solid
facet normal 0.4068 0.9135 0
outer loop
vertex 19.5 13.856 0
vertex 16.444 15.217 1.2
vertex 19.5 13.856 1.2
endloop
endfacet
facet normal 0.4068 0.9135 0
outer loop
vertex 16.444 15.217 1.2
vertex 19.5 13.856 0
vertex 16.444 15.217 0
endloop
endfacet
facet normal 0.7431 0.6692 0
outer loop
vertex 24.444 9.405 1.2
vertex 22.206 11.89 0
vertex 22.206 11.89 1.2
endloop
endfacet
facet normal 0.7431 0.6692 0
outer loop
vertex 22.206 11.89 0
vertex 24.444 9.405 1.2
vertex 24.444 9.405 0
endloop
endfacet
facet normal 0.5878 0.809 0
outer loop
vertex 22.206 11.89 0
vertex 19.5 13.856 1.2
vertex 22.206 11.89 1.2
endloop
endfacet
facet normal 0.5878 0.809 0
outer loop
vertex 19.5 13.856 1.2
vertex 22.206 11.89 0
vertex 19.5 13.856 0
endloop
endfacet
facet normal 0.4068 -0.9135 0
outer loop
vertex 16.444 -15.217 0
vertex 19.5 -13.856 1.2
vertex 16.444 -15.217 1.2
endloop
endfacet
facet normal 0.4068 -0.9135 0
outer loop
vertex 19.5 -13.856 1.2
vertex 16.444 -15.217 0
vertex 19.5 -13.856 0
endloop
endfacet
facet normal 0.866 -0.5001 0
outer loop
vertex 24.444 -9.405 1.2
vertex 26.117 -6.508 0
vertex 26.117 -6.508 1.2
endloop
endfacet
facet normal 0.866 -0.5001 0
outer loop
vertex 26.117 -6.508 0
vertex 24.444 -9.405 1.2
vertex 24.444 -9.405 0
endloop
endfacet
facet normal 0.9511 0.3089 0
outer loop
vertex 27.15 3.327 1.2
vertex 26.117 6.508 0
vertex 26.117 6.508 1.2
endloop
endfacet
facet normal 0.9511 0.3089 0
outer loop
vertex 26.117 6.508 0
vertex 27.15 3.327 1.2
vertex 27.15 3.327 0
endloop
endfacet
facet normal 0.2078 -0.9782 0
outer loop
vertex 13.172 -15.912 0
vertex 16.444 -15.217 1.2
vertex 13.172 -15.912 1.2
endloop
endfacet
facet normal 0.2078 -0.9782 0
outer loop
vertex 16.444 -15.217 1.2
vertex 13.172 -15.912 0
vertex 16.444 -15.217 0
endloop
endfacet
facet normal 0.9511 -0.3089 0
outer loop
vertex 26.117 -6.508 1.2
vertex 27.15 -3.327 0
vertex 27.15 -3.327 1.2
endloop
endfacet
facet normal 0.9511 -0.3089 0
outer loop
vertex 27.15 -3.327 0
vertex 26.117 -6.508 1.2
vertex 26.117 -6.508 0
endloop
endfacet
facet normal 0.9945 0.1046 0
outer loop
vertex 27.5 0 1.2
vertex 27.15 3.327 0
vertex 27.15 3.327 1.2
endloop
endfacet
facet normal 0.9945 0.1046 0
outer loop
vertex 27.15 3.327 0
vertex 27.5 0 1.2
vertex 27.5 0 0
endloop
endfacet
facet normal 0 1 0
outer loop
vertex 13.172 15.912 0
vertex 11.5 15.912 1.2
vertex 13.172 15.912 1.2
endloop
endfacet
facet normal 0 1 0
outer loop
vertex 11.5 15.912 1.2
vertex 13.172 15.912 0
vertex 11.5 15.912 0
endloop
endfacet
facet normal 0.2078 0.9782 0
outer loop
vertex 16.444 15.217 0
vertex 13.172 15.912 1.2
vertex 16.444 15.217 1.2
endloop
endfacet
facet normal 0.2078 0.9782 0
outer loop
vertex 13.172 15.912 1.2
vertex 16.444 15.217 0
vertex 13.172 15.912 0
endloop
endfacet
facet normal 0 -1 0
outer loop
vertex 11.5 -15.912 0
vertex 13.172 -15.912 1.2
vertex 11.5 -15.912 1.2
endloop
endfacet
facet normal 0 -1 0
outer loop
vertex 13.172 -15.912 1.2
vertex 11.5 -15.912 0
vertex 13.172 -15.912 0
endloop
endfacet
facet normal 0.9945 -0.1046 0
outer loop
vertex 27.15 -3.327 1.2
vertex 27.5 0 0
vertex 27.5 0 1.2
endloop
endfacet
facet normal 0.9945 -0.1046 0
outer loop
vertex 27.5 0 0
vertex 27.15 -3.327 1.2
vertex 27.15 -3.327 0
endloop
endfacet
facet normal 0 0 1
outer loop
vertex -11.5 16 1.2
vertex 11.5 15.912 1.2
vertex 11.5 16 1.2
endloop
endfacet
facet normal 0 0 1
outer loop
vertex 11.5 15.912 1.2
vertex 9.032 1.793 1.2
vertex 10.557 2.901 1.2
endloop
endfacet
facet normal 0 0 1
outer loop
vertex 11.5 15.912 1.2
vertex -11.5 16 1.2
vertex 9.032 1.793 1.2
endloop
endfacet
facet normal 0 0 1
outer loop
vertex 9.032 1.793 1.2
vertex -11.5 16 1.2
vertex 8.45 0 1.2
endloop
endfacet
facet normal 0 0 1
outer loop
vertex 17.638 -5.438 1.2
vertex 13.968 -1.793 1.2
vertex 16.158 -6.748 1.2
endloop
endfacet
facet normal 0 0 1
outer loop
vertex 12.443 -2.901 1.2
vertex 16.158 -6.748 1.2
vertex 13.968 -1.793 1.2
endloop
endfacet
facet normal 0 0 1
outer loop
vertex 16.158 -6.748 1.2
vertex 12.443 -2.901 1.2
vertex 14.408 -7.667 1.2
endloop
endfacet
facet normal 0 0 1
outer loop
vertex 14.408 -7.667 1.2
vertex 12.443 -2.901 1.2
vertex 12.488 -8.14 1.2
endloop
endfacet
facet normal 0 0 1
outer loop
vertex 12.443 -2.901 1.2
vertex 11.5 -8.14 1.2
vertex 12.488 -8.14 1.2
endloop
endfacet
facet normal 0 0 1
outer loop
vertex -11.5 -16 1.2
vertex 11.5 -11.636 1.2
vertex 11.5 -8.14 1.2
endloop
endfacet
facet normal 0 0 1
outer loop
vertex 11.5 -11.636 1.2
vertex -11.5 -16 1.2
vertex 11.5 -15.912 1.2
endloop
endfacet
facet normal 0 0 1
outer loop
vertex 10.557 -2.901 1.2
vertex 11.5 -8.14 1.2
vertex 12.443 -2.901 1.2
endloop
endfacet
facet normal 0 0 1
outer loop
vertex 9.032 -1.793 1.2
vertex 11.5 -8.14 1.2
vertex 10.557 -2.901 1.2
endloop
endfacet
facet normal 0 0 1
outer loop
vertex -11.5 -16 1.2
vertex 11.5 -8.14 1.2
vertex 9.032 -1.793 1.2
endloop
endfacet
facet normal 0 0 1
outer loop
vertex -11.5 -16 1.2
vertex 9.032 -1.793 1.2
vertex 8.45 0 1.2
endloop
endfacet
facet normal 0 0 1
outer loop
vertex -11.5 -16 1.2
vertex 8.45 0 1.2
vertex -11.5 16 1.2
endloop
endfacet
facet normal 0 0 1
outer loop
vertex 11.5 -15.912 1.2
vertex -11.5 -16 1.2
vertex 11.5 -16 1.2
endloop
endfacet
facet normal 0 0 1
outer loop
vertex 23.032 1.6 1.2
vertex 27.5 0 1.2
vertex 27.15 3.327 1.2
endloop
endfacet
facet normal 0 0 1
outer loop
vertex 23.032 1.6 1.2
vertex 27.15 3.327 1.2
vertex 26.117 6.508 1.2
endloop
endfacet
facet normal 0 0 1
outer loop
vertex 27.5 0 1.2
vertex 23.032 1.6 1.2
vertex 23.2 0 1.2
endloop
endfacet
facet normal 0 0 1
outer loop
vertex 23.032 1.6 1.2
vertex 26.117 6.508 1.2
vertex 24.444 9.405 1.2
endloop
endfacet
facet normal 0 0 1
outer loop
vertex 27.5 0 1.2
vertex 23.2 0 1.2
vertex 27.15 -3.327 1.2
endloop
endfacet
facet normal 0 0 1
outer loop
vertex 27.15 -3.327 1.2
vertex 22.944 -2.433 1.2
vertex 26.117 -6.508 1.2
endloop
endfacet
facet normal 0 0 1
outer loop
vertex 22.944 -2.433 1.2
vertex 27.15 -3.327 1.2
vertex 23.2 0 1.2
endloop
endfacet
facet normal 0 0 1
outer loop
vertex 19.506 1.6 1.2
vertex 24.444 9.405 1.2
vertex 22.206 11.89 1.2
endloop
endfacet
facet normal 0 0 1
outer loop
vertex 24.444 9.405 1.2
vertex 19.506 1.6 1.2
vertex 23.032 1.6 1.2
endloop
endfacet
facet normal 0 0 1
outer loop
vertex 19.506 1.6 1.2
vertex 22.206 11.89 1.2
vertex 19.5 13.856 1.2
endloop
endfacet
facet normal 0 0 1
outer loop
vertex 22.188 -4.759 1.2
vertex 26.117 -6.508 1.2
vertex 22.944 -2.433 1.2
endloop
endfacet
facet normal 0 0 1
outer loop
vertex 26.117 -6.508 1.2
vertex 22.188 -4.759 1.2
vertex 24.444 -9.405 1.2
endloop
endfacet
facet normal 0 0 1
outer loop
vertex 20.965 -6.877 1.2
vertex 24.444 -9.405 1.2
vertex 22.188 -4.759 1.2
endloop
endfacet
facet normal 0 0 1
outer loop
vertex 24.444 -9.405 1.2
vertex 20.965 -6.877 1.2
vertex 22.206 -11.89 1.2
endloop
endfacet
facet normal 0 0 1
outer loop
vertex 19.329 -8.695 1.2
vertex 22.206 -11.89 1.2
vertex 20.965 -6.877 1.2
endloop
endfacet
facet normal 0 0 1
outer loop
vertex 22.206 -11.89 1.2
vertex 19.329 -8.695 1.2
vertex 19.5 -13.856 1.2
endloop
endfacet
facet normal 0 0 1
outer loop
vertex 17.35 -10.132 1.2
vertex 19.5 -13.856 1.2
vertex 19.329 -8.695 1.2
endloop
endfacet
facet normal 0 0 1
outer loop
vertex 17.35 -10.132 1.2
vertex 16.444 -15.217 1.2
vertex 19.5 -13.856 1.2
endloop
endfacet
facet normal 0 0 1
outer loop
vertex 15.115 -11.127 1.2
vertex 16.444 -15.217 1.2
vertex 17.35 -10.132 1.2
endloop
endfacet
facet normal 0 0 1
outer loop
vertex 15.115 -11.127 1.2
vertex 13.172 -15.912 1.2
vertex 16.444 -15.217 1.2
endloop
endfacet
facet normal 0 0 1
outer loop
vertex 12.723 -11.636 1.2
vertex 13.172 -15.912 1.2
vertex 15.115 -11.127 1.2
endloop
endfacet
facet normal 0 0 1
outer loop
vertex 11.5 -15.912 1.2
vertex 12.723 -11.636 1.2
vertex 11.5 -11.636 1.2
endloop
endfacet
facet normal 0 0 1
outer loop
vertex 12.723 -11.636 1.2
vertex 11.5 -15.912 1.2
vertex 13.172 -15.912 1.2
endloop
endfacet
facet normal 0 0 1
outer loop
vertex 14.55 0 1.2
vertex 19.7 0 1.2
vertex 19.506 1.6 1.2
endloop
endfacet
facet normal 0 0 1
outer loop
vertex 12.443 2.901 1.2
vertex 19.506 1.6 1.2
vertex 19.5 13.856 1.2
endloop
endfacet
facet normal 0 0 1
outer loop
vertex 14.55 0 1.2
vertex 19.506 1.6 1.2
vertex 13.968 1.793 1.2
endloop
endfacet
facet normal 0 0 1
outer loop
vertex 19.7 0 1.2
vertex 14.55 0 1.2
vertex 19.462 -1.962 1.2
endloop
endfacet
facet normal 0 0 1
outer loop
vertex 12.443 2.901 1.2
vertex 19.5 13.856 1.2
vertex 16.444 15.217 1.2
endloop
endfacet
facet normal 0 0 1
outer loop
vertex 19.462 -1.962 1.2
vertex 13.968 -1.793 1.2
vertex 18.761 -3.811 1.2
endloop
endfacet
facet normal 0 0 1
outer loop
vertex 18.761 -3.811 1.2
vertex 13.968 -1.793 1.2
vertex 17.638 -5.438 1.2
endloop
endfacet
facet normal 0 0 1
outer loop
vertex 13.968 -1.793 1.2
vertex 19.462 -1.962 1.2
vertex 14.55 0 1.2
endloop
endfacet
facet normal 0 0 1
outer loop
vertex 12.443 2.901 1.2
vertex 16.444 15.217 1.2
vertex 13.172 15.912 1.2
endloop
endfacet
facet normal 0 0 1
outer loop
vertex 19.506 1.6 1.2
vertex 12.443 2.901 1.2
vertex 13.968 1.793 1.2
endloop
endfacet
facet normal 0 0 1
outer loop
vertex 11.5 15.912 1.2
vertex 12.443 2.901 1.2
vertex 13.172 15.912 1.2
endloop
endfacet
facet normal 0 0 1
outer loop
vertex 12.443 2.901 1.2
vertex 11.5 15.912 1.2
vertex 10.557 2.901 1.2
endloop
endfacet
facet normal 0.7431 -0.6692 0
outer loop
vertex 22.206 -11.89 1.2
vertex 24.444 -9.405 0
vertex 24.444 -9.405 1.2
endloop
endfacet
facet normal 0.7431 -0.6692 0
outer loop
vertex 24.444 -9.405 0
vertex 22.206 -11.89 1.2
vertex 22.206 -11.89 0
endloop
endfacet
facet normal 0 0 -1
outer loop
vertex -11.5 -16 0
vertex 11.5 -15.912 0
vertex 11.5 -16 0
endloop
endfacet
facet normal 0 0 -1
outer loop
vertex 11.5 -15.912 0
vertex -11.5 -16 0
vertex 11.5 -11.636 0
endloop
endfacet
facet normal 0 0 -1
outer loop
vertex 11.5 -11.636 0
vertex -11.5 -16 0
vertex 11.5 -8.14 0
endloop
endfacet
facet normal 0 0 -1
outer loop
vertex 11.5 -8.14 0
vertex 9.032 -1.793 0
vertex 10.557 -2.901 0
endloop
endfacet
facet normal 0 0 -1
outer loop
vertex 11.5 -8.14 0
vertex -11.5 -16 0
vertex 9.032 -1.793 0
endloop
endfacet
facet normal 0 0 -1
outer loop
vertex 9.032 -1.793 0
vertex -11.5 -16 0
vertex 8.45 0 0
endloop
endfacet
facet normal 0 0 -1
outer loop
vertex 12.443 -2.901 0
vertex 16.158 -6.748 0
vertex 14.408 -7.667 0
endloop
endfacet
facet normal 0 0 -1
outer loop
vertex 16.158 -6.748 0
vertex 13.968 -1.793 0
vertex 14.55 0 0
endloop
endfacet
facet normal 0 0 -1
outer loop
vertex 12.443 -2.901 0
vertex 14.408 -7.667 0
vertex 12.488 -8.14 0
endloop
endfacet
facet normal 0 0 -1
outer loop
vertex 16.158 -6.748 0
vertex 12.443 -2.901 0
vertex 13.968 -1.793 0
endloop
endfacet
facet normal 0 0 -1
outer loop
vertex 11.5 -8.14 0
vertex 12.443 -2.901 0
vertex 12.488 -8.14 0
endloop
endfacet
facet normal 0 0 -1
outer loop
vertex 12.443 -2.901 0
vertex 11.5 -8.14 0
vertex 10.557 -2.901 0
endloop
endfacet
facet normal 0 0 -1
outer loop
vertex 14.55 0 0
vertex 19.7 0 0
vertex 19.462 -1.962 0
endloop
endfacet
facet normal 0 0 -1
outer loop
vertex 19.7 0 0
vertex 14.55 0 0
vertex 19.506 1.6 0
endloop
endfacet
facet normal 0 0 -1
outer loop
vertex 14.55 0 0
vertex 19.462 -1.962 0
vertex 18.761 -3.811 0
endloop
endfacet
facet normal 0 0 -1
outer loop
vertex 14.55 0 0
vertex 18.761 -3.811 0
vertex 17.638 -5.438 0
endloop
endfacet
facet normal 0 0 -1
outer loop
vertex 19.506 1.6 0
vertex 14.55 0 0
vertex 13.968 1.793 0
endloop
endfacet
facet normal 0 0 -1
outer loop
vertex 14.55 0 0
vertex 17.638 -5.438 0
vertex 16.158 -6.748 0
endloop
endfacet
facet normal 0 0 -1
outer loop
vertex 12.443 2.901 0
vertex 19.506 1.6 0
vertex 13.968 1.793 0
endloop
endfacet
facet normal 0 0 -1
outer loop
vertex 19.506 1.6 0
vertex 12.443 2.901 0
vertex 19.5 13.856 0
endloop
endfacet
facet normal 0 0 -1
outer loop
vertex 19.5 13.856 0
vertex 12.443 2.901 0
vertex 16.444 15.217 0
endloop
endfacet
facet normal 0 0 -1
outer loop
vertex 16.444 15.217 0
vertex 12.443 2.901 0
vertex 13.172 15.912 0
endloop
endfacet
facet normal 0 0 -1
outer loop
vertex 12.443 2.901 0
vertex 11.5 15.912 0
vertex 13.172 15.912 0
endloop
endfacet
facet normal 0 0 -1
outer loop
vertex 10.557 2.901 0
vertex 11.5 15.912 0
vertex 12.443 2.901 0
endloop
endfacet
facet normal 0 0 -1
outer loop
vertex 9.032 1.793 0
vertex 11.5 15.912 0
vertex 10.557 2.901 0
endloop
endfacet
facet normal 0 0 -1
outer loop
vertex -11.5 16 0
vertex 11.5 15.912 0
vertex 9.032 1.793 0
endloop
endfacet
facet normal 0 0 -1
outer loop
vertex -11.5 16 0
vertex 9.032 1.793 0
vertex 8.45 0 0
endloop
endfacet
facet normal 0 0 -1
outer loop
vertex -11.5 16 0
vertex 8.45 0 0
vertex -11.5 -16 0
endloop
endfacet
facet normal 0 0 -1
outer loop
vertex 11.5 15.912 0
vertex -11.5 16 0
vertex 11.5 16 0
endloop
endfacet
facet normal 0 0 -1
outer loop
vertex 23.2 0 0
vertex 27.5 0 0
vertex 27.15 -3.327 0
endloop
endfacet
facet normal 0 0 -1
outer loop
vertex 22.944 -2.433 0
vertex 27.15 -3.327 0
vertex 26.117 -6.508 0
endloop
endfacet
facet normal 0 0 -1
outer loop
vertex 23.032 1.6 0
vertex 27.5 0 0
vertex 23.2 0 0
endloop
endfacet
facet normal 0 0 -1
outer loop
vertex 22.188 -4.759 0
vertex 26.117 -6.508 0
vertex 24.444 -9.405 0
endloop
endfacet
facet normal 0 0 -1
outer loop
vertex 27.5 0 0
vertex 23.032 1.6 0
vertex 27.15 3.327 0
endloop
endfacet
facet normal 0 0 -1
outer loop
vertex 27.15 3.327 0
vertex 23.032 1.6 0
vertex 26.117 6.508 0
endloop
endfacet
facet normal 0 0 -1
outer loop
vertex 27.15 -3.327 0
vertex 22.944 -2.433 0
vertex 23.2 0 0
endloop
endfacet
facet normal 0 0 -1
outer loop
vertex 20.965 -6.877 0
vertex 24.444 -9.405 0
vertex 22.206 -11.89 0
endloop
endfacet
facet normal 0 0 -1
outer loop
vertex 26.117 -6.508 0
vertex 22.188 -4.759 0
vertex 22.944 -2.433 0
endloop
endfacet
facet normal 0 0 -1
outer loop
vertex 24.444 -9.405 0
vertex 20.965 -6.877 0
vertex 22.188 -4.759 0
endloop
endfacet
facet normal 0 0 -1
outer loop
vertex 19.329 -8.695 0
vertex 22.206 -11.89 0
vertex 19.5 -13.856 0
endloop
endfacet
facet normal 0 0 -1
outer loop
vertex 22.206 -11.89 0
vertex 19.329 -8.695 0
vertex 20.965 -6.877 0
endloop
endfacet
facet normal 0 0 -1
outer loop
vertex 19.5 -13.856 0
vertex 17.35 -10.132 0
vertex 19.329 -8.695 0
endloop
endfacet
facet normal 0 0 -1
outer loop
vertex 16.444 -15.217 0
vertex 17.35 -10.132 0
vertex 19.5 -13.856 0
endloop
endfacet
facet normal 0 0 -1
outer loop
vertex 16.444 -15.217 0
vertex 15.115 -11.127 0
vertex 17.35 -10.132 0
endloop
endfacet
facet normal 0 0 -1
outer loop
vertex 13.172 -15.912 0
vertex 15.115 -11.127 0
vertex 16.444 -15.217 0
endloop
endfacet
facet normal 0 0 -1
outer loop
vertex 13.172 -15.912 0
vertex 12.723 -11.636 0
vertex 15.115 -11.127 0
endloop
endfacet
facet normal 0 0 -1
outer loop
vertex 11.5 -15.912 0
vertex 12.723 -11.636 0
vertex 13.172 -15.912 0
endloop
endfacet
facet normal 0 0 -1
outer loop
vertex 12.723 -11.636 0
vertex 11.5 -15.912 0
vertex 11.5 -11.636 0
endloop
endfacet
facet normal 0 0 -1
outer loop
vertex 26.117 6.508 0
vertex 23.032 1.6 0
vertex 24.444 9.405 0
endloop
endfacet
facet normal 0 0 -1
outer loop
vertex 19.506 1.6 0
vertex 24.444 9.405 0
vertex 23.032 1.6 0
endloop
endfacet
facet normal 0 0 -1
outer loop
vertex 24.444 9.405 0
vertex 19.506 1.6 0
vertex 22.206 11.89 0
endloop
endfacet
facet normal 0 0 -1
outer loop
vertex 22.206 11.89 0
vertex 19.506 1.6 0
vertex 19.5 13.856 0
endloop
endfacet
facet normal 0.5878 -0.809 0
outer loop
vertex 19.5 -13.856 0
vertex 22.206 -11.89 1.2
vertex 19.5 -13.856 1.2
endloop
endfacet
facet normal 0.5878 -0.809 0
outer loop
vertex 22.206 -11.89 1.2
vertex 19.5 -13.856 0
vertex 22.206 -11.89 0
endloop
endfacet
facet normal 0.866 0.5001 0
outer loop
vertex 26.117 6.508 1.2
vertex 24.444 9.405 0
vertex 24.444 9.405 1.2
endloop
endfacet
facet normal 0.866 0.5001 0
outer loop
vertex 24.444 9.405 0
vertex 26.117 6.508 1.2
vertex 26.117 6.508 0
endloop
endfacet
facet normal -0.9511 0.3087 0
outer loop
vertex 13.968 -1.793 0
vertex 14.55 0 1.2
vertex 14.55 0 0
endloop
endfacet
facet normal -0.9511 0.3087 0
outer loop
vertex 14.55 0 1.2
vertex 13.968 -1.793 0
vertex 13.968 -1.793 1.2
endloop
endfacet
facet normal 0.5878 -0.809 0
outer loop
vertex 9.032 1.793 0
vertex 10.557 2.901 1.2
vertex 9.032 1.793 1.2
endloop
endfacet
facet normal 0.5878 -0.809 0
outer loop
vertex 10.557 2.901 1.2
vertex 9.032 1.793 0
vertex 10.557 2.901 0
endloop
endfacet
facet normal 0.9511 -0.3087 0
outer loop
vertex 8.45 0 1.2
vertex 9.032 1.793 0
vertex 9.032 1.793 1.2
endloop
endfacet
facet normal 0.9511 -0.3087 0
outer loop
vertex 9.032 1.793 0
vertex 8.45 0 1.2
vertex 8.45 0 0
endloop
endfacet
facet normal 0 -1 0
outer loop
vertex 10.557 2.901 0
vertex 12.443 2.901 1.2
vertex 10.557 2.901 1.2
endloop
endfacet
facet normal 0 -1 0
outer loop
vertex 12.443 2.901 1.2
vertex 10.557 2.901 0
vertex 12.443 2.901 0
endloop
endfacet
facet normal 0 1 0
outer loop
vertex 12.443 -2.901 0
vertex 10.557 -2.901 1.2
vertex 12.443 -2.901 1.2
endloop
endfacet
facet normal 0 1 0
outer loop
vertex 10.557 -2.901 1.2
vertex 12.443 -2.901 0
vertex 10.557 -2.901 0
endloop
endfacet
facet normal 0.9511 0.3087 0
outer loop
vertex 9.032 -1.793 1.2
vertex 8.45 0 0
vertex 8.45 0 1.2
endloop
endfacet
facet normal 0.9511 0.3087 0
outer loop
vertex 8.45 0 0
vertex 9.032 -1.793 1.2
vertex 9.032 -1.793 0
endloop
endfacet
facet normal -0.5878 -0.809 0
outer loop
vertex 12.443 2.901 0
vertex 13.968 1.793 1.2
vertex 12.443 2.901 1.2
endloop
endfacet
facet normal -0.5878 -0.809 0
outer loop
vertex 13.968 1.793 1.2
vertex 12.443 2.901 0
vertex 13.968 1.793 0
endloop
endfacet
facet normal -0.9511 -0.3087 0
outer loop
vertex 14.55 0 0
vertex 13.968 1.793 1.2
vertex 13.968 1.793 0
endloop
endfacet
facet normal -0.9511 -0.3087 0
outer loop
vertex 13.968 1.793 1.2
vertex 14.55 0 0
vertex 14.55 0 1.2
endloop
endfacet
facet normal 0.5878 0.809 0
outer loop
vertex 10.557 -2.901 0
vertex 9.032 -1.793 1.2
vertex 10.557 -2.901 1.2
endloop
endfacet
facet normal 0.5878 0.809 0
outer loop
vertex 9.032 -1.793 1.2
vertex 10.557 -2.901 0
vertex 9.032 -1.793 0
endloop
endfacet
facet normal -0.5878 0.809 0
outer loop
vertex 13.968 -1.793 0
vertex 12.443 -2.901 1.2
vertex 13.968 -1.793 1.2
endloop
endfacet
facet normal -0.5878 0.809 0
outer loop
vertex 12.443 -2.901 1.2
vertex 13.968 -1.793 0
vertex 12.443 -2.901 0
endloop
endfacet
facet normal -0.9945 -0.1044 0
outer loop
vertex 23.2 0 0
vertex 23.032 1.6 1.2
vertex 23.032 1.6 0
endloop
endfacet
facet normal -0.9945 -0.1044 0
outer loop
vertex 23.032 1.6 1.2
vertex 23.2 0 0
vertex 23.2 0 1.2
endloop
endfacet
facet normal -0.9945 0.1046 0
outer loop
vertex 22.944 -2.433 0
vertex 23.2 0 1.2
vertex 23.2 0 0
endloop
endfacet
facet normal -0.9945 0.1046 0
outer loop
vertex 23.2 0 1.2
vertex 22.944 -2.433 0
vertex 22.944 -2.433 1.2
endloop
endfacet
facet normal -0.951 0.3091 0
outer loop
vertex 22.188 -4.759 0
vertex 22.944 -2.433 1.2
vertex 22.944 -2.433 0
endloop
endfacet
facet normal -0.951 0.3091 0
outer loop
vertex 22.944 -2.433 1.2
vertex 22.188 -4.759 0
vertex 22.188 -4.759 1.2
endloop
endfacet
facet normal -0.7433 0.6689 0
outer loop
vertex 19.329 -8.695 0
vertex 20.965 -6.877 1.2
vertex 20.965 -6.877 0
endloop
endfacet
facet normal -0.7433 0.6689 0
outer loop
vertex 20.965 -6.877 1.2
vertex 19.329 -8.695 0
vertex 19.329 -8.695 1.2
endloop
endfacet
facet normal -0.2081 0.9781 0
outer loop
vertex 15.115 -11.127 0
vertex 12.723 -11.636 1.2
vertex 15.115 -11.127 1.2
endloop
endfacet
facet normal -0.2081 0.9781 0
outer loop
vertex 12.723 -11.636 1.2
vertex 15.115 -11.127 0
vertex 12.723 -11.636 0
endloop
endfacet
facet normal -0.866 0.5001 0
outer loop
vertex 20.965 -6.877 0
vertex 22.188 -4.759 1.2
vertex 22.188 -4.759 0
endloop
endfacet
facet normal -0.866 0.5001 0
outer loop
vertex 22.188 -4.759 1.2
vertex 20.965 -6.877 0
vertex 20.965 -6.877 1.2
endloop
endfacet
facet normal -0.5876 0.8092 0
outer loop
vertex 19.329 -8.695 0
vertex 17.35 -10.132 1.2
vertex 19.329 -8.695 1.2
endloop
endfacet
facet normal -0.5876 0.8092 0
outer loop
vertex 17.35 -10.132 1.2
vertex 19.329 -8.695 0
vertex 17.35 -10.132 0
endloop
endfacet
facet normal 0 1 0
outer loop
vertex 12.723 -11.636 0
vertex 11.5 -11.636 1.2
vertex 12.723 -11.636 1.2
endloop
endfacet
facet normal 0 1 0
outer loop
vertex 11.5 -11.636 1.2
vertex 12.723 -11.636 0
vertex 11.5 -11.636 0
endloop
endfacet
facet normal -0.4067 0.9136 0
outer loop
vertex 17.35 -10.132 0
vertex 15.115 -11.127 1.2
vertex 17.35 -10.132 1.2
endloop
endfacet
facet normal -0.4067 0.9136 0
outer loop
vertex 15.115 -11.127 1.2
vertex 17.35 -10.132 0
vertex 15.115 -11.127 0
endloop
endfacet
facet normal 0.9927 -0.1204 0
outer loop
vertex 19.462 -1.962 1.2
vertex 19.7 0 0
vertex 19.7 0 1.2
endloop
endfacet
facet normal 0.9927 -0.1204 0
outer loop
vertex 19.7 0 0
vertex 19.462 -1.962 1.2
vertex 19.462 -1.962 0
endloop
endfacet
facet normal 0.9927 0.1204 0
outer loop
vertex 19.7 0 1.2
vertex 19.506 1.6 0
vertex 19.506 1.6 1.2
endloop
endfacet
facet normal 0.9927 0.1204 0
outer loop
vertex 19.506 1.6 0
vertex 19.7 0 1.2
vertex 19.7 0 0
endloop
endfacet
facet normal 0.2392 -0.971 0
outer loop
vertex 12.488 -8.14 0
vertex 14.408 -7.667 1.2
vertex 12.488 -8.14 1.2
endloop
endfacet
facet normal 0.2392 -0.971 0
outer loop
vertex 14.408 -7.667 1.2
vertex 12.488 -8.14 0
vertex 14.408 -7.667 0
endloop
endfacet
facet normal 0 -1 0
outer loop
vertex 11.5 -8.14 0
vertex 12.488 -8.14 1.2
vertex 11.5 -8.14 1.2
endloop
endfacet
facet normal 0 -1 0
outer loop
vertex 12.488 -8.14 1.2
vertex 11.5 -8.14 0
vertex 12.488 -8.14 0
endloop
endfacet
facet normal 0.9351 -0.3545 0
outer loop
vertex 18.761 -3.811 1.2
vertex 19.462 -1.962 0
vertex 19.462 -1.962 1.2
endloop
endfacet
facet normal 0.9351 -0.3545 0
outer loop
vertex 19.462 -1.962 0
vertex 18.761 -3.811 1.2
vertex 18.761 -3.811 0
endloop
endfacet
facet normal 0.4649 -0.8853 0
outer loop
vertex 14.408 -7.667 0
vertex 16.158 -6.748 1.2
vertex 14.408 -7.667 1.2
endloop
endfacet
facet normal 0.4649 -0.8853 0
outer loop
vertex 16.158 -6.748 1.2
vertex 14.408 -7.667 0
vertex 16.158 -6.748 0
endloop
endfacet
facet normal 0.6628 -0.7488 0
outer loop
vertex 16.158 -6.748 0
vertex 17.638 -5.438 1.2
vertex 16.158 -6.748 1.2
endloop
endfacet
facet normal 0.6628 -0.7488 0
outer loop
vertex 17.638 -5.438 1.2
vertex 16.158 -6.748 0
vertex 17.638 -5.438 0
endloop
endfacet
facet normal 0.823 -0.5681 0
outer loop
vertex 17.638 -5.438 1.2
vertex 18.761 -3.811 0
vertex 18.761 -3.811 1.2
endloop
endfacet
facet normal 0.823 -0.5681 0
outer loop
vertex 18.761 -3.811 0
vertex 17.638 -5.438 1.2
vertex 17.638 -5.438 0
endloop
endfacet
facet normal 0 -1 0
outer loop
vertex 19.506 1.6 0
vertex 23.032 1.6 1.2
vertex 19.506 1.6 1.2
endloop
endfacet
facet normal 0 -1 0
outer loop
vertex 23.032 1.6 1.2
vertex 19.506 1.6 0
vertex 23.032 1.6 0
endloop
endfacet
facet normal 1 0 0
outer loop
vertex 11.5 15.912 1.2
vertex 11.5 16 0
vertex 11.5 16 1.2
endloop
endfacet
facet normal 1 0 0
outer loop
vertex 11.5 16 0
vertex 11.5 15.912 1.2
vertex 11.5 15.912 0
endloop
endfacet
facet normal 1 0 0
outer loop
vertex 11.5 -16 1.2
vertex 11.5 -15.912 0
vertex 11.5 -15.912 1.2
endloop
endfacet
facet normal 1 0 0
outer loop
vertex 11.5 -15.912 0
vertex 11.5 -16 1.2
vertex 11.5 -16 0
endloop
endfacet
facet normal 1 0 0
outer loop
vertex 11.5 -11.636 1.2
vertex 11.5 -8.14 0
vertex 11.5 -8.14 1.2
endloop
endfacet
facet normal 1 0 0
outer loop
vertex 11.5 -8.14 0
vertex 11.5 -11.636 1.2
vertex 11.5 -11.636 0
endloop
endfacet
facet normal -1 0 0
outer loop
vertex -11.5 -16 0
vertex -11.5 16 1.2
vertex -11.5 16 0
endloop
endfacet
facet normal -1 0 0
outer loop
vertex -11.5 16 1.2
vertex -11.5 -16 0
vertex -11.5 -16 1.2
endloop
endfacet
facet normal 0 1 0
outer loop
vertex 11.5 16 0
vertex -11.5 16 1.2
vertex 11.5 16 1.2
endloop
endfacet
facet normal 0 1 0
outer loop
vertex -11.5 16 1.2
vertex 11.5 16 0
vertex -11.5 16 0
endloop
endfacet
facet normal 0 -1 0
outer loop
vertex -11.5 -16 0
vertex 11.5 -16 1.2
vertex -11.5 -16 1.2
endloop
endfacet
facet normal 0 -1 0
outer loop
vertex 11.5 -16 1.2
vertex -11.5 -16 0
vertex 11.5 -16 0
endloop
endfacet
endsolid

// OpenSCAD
translate([0,0,1.2/2])
rotate([0,90,0])
difference(){
translate([0,0,23/2])
rotate([0,90,0])

difference(){
cylinder(h=1.2,r=16,center=true);
cylinder(h=10.15+0.001,r=6.1/2,center=true);
}
translate([0,0,23/2])
rotate([0,-90,0])
color([1,0,2])
difference(){
cylinder(h=10.2,r=11.7,center=true);
cylinder(h=10.21,r=8.2,center=true);

translate([-12/2-1.6,0,0])
cube([12,12*2,11],center=true);
    
translate([-1.7,1.6,-12/2])   
cube([14,11.6*2,12]);

}
}
translate([0,0,1.2/2])
rotate([0,90,0])
difference(){
cube([1.2,32,23],center=true);

translate([0,0,23/2])
rotate([0,90,0])
    cylinder(h=11+0.001,r=6.1/2,center=true);
}
